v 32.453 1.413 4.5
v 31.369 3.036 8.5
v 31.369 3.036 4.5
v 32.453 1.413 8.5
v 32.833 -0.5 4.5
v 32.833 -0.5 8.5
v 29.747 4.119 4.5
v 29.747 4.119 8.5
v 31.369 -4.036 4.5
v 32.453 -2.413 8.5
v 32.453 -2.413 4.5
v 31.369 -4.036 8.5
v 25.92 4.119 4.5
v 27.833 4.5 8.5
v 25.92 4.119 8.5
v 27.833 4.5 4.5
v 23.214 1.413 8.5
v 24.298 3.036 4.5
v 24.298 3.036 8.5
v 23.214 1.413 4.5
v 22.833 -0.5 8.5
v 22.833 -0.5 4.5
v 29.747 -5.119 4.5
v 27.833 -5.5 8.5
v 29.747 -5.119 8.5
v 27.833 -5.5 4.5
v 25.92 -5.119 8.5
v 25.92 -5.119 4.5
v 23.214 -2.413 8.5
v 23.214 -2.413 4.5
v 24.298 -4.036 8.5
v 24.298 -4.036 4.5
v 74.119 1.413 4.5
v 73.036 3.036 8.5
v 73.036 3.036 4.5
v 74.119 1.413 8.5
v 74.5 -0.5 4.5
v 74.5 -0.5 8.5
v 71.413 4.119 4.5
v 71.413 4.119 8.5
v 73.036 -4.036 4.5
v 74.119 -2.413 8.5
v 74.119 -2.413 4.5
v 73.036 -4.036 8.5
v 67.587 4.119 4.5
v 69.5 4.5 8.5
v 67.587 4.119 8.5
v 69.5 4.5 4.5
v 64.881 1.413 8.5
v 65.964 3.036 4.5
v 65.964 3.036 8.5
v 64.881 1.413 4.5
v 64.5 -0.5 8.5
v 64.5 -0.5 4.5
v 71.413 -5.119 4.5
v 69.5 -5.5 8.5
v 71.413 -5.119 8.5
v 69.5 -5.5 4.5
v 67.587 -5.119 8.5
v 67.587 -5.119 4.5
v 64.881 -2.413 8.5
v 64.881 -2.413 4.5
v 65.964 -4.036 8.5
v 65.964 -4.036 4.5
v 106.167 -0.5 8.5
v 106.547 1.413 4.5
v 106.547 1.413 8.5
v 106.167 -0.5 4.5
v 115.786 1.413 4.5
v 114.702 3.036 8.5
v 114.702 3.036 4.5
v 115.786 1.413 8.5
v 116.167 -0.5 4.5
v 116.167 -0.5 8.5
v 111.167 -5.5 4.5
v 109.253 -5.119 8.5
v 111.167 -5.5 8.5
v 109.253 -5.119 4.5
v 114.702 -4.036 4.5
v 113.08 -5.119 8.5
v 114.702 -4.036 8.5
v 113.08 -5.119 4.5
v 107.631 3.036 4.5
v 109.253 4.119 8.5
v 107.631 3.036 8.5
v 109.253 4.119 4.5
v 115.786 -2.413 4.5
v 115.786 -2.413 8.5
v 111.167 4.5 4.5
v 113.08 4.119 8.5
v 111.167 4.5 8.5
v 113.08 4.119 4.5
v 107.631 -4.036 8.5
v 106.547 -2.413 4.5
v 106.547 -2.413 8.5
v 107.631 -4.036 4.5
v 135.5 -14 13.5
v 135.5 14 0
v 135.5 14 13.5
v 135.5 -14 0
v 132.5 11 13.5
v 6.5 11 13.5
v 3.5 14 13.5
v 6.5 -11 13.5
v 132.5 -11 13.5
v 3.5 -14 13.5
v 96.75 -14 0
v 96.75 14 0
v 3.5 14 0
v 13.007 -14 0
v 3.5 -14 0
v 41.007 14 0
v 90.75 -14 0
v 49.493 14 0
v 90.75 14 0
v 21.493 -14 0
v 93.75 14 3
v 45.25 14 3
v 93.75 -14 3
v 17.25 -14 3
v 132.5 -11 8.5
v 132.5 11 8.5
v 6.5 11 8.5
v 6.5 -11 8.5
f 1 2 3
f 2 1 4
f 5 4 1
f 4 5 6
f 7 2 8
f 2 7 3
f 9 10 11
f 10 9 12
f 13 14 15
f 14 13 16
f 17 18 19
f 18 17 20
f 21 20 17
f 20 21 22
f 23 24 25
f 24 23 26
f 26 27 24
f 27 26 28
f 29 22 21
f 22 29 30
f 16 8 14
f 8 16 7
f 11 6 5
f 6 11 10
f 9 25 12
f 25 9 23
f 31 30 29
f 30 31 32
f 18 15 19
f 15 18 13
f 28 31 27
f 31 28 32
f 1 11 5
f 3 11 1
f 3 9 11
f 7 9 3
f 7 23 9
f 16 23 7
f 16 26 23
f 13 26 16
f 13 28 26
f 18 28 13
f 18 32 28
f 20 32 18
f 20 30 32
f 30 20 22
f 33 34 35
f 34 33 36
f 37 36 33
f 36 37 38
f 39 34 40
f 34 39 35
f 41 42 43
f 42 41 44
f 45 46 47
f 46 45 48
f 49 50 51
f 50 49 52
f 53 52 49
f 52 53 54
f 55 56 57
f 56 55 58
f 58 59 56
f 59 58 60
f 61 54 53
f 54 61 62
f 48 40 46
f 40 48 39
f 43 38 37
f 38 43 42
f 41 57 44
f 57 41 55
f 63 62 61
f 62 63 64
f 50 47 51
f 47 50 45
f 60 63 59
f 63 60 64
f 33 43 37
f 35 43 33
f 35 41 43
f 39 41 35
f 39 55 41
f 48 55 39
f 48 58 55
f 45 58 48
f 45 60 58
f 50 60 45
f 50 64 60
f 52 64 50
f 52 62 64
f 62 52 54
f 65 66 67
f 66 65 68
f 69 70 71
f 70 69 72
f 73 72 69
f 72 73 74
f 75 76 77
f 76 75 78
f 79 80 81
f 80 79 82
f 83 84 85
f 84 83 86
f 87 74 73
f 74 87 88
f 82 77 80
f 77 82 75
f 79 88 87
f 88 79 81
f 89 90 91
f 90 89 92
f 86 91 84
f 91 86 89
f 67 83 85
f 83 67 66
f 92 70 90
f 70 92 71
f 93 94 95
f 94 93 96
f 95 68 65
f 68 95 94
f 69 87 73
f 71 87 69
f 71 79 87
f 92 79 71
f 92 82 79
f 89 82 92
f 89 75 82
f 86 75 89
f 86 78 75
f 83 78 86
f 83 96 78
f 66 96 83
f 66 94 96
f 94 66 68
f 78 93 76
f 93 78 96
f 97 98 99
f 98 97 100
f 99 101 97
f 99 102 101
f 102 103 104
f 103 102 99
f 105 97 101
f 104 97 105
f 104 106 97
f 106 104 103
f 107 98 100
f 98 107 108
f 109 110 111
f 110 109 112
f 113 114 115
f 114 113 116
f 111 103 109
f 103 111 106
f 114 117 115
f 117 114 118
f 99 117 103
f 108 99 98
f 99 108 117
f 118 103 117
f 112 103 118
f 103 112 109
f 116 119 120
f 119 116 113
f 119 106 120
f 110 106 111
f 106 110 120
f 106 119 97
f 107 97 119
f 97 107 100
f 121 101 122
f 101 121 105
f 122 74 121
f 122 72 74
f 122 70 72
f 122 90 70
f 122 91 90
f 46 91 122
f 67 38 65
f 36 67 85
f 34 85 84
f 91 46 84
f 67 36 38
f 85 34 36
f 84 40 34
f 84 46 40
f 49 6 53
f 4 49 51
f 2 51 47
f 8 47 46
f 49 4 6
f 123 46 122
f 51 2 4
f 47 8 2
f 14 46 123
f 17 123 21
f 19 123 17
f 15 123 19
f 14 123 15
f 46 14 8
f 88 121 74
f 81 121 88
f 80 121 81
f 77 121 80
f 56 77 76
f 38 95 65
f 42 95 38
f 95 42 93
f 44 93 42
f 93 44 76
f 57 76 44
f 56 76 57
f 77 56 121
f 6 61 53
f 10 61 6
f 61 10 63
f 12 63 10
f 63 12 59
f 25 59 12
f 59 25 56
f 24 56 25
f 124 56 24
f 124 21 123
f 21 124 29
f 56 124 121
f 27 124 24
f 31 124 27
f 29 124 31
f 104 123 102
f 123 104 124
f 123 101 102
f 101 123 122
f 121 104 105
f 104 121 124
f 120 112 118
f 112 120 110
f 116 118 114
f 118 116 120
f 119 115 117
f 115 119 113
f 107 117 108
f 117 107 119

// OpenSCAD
// measured from the vise
vise_jaw_width = 125; 

// measured from the vise
vise_jaw_height = 21;

// how far to extend the "walls" of the jaw around the top, bottom, and sides of the vise jaw
surround_depth = 5;

// is the measured distance the vise jaw extends past the vise body
overlap = 1.26;

// desired value. The printed thickness of the face will be the greater of soft_jaw_face_thickness and cutout_guide_radius + 1.5
soft_jaw_face_thickness = 6;

// desired value 
soft_jaw_wall_thickness = 3;

// controls how deep the guides are cut into the face of the soft jaws. 3mm is good for holding small round stock. If you want to hold stock bigger than about 3/8", increase the guide radius. 
cutout_guide_radius = 3; 

// controls the angles at which the guides are cut into the face of the soft jaws. You might print one face with a guide at [0] and the other face with guides at [45,90].
cutout_angles = [45,90];

// inserts some slop at certain dimensions to allow for printer spooge
fudge_factor = 0.5;

magnet_diameter = 10;
magnet_depth = 4;
magnet_count = 3;

guide_radius = 3;
guide_angles = [45, 90];


mOff = vise_jaw_width/magnet_count;
gOff = vise_jaw_width/len(guide_angles);
jDepth = max(soft_jaw_face_thickness, 
  magnet_depth + 
  (len(guide_angles) > 0 ?  guide_radius : 0) +
  1.5
);

difference() {
  translate([
    soft_jaw_wall_thickness + fudge_factor,
    -vise_jaw_height/2-soft_jaw_wall_thickness-fudge_factor,
    0])
    difference() {
      cube([
        vise_jaw_width + fudge_factor*2 + soft_jaw_wall_thickness*2, 
        vise_jaw_height + fudge_factor*2 + soft_jaw_wall_thickness*2, 
        jDepth + surround_depth]);
      translate([soft_jaw_wall_thickness, soft_jaw_wall_thickness, jDepth]) 
        cube([vise_jaw_width + fudge_factor*2, vise_jaw_height + fudge_factor*2, surround_depth+1]);
      for (step = [magnet_count-1 : 0]) {
        translate([soft_jaw_wall_thickness + fudge_factor + mOff*(step+0.5), vise_jaw_height/2 + soft_jaw_wall_thickness, jDepth - magnet_depth])
          cylinder(r=magnet_diameter/2, h=magnet_depth+1, center=false);
      }
    }
    for (i = [len(guide_angles)-1:0])
      translate([gOff*(i+0.5),0])
        rotate([0,90,guide_angles[i]])
          cylinder(r=guide_radius, h=2*vise_jaw_width, center=true, $fn=4);
}
